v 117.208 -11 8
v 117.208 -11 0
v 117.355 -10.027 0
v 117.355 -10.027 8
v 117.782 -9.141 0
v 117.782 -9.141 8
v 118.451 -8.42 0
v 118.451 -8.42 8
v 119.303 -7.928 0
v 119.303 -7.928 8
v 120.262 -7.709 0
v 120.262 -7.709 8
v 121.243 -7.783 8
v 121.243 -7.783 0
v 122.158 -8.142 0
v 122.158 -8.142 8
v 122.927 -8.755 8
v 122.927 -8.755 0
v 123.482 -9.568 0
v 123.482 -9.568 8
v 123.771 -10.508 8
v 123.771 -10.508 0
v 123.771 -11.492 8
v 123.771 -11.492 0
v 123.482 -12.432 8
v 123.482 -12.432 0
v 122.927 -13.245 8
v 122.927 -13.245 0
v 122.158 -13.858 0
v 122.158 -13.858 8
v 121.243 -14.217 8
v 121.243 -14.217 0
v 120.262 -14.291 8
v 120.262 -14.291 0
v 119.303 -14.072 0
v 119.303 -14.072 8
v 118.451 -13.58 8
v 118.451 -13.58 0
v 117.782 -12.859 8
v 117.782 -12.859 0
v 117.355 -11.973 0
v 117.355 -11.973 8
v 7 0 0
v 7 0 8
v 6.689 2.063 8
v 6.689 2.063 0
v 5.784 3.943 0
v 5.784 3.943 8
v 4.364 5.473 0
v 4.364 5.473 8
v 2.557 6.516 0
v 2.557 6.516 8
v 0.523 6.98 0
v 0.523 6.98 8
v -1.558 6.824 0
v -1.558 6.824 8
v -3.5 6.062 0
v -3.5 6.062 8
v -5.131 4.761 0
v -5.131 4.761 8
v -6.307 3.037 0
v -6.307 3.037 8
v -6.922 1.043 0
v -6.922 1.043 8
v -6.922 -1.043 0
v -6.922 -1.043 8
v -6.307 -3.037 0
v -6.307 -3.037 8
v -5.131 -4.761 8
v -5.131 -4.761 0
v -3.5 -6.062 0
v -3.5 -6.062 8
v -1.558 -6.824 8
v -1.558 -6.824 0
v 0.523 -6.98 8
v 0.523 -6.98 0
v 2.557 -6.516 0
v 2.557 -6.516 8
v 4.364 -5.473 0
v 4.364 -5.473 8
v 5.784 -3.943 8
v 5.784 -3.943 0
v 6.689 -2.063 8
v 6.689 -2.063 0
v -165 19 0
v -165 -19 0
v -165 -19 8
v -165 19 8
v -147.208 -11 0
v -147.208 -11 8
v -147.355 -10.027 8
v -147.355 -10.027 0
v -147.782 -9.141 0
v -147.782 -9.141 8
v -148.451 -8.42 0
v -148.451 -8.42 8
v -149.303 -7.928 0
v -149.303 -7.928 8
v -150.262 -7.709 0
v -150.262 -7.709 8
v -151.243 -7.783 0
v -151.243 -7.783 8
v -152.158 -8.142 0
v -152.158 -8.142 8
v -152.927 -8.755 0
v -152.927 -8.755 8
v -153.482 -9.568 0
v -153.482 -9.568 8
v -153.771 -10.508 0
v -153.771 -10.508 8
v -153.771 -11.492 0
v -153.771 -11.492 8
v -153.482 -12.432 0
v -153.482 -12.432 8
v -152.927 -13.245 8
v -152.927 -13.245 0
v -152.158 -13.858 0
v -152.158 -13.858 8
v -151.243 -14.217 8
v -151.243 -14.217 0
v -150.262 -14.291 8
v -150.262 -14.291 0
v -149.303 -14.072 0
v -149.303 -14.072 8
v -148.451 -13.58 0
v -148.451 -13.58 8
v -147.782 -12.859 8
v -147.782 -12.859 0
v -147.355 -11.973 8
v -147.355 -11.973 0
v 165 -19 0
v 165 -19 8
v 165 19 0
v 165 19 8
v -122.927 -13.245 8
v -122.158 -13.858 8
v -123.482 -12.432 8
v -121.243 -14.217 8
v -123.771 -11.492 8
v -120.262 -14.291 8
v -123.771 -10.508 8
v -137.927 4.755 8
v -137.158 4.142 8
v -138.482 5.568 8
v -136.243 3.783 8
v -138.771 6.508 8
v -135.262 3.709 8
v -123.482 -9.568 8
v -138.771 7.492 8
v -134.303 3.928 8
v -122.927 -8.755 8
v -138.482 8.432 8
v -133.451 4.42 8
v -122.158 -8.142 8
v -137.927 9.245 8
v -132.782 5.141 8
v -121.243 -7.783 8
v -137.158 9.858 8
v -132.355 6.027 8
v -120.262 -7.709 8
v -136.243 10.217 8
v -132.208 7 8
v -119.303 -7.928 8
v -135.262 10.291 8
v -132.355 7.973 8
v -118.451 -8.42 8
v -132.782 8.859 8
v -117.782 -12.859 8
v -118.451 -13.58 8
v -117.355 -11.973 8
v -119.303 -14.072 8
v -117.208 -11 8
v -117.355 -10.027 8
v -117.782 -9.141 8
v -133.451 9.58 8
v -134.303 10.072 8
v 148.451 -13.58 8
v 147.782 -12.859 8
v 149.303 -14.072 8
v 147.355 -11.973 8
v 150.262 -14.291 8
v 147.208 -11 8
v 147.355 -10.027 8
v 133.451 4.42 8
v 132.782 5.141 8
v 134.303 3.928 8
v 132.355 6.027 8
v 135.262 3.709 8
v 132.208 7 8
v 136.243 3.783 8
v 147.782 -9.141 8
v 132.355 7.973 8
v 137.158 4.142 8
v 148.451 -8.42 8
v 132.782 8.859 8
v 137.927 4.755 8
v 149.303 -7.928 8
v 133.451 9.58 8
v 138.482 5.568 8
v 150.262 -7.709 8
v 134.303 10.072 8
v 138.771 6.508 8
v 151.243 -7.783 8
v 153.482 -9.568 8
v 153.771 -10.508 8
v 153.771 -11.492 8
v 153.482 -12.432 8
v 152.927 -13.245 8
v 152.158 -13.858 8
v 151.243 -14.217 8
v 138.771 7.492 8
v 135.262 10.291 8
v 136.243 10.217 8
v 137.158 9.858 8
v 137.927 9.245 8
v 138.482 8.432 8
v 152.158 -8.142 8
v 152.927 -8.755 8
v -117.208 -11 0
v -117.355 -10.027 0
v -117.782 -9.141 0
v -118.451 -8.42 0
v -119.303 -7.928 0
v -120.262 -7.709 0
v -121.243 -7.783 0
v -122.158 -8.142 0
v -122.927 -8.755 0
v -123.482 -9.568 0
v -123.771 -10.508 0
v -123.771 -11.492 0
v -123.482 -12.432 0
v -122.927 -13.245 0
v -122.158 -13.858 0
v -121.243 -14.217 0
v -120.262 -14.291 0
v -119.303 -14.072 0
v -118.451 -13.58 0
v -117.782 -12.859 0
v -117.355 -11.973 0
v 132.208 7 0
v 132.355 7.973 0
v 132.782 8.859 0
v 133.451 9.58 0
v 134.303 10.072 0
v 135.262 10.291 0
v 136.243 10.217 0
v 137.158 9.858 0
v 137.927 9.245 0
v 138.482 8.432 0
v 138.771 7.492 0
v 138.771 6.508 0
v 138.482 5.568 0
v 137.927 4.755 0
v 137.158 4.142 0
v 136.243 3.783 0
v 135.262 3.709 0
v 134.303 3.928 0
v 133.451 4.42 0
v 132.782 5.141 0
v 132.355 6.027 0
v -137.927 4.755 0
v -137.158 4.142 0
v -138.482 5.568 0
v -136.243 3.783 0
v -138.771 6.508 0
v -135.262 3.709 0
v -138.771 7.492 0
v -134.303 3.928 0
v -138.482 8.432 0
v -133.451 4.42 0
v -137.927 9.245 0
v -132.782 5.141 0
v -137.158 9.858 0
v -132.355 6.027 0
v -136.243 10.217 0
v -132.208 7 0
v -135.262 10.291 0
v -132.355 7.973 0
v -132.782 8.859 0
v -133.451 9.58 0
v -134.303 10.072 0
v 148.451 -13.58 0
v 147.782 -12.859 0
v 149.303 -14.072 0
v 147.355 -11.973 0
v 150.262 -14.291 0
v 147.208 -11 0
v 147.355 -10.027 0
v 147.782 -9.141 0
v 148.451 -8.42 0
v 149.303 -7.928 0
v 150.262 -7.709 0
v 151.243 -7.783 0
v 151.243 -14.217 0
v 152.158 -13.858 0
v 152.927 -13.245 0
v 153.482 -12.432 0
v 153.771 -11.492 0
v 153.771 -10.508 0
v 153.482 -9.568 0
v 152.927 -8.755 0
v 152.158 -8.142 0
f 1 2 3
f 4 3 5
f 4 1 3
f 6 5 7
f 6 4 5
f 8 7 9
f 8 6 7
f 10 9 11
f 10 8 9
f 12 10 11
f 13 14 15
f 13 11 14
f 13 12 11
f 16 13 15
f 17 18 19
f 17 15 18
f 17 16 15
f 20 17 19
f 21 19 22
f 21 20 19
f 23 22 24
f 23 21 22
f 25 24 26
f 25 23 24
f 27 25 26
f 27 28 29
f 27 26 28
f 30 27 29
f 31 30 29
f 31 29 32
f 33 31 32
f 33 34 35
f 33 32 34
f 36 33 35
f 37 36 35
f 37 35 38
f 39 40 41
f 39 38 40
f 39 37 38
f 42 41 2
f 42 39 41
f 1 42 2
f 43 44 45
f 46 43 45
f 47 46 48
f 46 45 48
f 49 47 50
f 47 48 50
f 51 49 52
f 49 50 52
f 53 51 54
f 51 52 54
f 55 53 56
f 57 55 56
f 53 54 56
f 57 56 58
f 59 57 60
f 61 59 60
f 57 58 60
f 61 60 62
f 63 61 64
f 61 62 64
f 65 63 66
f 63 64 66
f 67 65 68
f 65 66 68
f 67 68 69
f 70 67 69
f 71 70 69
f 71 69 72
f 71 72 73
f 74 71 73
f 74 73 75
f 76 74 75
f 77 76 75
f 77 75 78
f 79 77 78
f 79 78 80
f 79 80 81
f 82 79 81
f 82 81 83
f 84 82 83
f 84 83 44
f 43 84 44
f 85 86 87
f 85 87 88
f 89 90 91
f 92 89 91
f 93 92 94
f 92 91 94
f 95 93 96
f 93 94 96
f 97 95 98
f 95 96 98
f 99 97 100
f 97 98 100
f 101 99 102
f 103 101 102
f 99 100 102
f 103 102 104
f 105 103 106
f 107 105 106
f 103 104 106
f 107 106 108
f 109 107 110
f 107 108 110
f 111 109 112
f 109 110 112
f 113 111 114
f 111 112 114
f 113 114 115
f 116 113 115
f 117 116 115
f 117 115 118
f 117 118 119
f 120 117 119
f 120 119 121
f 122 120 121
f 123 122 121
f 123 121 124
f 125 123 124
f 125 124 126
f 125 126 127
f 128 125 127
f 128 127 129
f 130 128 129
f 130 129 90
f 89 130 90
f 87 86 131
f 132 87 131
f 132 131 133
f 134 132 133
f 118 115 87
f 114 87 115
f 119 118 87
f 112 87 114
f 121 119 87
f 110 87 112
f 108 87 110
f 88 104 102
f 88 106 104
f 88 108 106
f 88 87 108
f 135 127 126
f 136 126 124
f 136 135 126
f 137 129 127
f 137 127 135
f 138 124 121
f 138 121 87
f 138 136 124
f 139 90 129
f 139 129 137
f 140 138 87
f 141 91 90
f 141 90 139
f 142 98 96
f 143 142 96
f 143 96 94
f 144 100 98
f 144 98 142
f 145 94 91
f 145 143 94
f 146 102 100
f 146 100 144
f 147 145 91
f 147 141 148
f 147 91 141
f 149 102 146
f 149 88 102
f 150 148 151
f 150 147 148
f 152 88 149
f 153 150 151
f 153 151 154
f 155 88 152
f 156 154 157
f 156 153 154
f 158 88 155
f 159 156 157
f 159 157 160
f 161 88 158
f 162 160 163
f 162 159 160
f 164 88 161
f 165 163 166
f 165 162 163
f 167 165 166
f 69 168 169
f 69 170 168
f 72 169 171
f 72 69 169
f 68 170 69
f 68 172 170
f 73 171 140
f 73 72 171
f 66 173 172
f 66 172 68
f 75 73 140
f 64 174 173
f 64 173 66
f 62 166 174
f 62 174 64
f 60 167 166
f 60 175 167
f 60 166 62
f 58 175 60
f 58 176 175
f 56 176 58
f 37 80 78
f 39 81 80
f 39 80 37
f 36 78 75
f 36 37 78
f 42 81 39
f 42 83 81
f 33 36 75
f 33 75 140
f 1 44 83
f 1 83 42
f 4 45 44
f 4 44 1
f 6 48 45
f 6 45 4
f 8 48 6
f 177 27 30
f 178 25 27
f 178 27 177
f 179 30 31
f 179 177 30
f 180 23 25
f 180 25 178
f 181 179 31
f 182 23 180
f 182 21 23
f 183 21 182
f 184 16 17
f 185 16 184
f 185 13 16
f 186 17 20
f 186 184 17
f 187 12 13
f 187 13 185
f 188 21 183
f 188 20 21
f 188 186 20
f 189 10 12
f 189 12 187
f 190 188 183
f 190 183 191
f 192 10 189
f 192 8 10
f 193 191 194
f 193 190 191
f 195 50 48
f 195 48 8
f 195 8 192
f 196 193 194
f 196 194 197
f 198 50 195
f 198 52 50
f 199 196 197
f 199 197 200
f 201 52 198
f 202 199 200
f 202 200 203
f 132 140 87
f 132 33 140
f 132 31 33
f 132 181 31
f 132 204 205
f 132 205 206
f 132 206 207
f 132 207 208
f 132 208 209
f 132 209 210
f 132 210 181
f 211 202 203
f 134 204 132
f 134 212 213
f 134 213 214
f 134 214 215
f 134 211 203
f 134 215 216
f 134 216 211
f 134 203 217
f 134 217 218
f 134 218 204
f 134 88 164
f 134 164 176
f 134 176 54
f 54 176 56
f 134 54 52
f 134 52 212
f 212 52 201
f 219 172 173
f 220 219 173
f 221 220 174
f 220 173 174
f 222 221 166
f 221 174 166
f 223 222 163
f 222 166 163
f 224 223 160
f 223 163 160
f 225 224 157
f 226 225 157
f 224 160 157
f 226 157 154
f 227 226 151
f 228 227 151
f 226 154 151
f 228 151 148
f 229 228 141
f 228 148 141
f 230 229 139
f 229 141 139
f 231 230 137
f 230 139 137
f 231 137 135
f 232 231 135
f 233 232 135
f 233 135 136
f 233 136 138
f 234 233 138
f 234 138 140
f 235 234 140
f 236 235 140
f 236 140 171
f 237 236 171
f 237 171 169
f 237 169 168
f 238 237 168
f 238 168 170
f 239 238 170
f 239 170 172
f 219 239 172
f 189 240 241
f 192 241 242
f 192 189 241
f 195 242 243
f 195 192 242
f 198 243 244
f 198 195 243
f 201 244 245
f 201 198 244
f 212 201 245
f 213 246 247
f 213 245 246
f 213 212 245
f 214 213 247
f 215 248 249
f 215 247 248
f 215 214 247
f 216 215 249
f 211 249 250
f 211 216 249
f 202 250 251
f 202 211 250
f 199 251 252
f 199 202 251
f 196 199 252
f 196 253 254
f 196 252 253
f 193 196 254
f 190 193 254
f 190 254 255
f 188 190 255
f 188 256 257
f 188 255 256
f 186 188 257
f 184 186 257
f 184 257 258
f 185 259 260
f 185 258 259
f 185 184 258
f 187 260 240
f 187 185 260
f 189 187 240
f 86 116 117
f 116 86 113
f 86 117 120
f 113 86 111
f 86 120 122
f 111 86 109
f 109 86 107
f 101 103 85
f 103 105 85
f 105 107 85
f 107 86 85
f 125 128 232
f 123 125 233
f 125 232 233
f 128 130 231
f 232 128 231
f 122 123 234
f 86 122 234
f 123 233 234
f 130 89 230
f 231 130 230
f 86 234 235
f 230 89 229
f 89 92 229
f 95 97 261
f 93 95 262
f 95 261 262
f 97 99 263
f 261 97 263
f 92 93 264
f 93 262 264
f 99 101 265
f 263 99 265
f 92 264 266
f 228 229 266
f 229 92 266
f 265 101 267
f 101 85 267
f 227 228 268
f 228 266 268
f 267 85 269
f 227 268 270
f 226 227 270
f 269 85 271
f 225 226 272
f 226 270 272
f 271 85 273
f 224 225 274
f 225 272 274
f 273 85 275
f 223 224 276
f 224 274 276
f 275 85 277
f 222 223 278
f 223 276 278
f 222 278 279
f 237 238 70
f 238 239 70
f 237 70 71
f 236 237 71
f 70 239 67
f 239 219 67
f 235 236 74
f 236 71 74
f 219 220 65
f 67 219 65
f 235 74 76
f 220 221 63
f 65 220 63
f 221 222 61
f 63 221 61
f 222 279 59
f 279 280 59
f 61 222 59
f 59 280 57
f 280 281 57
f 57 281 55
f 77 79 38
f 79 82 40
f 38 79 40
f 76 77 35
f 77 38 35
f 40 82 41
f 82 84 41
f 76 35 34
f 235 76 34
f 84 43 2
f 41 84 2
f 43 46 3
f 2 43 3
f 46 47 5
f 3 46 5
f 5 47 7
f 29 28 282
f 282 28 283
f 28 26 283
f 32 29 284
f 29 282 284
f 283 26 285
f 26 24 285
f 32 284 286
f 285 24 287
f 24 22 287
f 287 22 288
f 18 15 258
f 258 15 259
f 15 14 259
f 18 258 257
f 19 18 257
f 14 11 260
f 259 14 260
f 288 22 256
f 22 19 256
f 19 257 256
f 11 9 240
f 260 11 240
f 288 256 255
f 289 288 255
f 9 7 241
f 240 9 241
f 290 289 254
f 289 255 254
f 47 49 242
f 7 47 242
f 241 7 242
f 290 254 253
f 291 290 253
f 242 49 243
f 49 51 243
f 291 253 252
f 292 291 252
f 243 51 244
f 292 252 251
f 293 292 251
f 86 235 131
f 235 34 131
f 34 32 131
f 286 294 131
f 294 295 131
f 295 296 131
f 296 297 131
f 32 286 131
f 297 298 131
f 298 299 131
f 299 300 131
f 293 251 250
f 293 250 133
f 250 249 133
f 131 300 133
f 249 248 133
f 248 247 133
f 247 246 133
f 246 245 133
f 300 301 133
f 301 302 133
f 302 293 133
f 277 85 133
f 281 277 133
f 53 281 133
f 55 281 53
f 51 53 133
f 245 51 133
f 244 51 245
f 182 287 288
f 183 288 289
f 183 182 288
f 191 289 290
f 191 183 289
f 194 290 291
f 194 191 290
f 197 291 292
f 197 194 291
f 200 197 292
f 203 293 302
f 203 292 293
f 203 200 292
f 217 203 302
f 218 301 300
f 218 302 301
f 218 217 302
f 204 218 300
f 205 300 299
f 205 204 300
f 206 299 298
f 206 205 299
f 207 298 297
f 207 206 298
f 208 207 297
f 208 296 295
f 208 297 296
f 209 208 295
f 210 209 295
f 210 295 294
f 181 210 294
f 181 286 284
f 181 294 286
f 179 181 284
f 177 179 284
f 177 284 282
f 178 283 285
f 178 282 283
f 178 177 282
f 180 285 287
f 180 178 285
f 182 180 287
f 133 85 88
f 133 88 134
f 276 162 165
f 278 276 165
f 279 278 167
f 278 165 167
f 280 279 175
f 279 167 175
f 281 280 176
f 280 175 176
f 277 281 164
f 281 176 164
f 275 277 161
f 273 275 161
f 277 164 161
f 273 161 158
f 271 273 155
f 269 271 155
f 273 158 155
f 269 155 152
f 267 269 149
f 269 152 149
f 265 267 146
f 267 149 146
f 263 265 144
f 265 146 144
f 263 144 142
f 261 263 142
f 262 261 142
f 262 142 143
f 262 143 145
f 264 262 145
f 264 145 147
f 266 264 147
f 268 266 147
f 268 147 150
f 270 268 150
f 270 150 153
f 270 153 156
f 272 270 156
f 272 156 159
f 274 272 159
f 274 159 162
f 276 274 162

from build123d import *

# Parameters (mm, degrees)
SKETCH2_W           = 330
SKETCH2_H           = 38
BOSS_EXTRUDE1_DEPTH = 8
SKETCH3_R           = 7
CUT_EXTRUDE1_DEPTH  = 9
SKETCH4_R           = 3.3
CUT_EXTRUDE2_DEPTH  = 9


with BuildPart() as part:
    # Sketch2 → Boss-Extrude1 (new body)
    with BuildSketch(Plane.XY):
        Rectangle(SKETCH2_W, SKETCH2_H)
    extrude(amount=BOSS_EXTRUDE1_DEPTH)

    # Sketch3 → Cut-Extrude1 (cut, through all)
    with BuildSketch(Plane.XY.offset(8)):
        Circle(SKETCH3_R)
    extrude(amount=-CUT_EXTRUDE1_DEPTH, mode=Mode.SUBTRACT)

    # Sketch4 → Cut-Extrude2 (cut, through all)
    with BuildSketch(Plane.XY.offset(8)):
        with Locations((-135.508311731, 7)):
            Circle(SKETCH4_R)
        with Locations((-120.508311731, -11)):
            Circle(SKETCH4_R)
        with Locations((-150.508311731, -11)):
            Circle(SKETCH4_R)
    cut_extrude2 = extrude(amount=-CUT_EXTRUDE2_DEPTH, mode=Mode.SUBTRACT)

    # Mirror1: Cut-Extrude2 across plane
    add(cut_extrude2.mirror(Plane(origin=(0, 0, 0), x_dir=(0, 0, 1), z_dir=(1, 0, 0))), mode=Mode.SUBTRACT)


solid = part.part
